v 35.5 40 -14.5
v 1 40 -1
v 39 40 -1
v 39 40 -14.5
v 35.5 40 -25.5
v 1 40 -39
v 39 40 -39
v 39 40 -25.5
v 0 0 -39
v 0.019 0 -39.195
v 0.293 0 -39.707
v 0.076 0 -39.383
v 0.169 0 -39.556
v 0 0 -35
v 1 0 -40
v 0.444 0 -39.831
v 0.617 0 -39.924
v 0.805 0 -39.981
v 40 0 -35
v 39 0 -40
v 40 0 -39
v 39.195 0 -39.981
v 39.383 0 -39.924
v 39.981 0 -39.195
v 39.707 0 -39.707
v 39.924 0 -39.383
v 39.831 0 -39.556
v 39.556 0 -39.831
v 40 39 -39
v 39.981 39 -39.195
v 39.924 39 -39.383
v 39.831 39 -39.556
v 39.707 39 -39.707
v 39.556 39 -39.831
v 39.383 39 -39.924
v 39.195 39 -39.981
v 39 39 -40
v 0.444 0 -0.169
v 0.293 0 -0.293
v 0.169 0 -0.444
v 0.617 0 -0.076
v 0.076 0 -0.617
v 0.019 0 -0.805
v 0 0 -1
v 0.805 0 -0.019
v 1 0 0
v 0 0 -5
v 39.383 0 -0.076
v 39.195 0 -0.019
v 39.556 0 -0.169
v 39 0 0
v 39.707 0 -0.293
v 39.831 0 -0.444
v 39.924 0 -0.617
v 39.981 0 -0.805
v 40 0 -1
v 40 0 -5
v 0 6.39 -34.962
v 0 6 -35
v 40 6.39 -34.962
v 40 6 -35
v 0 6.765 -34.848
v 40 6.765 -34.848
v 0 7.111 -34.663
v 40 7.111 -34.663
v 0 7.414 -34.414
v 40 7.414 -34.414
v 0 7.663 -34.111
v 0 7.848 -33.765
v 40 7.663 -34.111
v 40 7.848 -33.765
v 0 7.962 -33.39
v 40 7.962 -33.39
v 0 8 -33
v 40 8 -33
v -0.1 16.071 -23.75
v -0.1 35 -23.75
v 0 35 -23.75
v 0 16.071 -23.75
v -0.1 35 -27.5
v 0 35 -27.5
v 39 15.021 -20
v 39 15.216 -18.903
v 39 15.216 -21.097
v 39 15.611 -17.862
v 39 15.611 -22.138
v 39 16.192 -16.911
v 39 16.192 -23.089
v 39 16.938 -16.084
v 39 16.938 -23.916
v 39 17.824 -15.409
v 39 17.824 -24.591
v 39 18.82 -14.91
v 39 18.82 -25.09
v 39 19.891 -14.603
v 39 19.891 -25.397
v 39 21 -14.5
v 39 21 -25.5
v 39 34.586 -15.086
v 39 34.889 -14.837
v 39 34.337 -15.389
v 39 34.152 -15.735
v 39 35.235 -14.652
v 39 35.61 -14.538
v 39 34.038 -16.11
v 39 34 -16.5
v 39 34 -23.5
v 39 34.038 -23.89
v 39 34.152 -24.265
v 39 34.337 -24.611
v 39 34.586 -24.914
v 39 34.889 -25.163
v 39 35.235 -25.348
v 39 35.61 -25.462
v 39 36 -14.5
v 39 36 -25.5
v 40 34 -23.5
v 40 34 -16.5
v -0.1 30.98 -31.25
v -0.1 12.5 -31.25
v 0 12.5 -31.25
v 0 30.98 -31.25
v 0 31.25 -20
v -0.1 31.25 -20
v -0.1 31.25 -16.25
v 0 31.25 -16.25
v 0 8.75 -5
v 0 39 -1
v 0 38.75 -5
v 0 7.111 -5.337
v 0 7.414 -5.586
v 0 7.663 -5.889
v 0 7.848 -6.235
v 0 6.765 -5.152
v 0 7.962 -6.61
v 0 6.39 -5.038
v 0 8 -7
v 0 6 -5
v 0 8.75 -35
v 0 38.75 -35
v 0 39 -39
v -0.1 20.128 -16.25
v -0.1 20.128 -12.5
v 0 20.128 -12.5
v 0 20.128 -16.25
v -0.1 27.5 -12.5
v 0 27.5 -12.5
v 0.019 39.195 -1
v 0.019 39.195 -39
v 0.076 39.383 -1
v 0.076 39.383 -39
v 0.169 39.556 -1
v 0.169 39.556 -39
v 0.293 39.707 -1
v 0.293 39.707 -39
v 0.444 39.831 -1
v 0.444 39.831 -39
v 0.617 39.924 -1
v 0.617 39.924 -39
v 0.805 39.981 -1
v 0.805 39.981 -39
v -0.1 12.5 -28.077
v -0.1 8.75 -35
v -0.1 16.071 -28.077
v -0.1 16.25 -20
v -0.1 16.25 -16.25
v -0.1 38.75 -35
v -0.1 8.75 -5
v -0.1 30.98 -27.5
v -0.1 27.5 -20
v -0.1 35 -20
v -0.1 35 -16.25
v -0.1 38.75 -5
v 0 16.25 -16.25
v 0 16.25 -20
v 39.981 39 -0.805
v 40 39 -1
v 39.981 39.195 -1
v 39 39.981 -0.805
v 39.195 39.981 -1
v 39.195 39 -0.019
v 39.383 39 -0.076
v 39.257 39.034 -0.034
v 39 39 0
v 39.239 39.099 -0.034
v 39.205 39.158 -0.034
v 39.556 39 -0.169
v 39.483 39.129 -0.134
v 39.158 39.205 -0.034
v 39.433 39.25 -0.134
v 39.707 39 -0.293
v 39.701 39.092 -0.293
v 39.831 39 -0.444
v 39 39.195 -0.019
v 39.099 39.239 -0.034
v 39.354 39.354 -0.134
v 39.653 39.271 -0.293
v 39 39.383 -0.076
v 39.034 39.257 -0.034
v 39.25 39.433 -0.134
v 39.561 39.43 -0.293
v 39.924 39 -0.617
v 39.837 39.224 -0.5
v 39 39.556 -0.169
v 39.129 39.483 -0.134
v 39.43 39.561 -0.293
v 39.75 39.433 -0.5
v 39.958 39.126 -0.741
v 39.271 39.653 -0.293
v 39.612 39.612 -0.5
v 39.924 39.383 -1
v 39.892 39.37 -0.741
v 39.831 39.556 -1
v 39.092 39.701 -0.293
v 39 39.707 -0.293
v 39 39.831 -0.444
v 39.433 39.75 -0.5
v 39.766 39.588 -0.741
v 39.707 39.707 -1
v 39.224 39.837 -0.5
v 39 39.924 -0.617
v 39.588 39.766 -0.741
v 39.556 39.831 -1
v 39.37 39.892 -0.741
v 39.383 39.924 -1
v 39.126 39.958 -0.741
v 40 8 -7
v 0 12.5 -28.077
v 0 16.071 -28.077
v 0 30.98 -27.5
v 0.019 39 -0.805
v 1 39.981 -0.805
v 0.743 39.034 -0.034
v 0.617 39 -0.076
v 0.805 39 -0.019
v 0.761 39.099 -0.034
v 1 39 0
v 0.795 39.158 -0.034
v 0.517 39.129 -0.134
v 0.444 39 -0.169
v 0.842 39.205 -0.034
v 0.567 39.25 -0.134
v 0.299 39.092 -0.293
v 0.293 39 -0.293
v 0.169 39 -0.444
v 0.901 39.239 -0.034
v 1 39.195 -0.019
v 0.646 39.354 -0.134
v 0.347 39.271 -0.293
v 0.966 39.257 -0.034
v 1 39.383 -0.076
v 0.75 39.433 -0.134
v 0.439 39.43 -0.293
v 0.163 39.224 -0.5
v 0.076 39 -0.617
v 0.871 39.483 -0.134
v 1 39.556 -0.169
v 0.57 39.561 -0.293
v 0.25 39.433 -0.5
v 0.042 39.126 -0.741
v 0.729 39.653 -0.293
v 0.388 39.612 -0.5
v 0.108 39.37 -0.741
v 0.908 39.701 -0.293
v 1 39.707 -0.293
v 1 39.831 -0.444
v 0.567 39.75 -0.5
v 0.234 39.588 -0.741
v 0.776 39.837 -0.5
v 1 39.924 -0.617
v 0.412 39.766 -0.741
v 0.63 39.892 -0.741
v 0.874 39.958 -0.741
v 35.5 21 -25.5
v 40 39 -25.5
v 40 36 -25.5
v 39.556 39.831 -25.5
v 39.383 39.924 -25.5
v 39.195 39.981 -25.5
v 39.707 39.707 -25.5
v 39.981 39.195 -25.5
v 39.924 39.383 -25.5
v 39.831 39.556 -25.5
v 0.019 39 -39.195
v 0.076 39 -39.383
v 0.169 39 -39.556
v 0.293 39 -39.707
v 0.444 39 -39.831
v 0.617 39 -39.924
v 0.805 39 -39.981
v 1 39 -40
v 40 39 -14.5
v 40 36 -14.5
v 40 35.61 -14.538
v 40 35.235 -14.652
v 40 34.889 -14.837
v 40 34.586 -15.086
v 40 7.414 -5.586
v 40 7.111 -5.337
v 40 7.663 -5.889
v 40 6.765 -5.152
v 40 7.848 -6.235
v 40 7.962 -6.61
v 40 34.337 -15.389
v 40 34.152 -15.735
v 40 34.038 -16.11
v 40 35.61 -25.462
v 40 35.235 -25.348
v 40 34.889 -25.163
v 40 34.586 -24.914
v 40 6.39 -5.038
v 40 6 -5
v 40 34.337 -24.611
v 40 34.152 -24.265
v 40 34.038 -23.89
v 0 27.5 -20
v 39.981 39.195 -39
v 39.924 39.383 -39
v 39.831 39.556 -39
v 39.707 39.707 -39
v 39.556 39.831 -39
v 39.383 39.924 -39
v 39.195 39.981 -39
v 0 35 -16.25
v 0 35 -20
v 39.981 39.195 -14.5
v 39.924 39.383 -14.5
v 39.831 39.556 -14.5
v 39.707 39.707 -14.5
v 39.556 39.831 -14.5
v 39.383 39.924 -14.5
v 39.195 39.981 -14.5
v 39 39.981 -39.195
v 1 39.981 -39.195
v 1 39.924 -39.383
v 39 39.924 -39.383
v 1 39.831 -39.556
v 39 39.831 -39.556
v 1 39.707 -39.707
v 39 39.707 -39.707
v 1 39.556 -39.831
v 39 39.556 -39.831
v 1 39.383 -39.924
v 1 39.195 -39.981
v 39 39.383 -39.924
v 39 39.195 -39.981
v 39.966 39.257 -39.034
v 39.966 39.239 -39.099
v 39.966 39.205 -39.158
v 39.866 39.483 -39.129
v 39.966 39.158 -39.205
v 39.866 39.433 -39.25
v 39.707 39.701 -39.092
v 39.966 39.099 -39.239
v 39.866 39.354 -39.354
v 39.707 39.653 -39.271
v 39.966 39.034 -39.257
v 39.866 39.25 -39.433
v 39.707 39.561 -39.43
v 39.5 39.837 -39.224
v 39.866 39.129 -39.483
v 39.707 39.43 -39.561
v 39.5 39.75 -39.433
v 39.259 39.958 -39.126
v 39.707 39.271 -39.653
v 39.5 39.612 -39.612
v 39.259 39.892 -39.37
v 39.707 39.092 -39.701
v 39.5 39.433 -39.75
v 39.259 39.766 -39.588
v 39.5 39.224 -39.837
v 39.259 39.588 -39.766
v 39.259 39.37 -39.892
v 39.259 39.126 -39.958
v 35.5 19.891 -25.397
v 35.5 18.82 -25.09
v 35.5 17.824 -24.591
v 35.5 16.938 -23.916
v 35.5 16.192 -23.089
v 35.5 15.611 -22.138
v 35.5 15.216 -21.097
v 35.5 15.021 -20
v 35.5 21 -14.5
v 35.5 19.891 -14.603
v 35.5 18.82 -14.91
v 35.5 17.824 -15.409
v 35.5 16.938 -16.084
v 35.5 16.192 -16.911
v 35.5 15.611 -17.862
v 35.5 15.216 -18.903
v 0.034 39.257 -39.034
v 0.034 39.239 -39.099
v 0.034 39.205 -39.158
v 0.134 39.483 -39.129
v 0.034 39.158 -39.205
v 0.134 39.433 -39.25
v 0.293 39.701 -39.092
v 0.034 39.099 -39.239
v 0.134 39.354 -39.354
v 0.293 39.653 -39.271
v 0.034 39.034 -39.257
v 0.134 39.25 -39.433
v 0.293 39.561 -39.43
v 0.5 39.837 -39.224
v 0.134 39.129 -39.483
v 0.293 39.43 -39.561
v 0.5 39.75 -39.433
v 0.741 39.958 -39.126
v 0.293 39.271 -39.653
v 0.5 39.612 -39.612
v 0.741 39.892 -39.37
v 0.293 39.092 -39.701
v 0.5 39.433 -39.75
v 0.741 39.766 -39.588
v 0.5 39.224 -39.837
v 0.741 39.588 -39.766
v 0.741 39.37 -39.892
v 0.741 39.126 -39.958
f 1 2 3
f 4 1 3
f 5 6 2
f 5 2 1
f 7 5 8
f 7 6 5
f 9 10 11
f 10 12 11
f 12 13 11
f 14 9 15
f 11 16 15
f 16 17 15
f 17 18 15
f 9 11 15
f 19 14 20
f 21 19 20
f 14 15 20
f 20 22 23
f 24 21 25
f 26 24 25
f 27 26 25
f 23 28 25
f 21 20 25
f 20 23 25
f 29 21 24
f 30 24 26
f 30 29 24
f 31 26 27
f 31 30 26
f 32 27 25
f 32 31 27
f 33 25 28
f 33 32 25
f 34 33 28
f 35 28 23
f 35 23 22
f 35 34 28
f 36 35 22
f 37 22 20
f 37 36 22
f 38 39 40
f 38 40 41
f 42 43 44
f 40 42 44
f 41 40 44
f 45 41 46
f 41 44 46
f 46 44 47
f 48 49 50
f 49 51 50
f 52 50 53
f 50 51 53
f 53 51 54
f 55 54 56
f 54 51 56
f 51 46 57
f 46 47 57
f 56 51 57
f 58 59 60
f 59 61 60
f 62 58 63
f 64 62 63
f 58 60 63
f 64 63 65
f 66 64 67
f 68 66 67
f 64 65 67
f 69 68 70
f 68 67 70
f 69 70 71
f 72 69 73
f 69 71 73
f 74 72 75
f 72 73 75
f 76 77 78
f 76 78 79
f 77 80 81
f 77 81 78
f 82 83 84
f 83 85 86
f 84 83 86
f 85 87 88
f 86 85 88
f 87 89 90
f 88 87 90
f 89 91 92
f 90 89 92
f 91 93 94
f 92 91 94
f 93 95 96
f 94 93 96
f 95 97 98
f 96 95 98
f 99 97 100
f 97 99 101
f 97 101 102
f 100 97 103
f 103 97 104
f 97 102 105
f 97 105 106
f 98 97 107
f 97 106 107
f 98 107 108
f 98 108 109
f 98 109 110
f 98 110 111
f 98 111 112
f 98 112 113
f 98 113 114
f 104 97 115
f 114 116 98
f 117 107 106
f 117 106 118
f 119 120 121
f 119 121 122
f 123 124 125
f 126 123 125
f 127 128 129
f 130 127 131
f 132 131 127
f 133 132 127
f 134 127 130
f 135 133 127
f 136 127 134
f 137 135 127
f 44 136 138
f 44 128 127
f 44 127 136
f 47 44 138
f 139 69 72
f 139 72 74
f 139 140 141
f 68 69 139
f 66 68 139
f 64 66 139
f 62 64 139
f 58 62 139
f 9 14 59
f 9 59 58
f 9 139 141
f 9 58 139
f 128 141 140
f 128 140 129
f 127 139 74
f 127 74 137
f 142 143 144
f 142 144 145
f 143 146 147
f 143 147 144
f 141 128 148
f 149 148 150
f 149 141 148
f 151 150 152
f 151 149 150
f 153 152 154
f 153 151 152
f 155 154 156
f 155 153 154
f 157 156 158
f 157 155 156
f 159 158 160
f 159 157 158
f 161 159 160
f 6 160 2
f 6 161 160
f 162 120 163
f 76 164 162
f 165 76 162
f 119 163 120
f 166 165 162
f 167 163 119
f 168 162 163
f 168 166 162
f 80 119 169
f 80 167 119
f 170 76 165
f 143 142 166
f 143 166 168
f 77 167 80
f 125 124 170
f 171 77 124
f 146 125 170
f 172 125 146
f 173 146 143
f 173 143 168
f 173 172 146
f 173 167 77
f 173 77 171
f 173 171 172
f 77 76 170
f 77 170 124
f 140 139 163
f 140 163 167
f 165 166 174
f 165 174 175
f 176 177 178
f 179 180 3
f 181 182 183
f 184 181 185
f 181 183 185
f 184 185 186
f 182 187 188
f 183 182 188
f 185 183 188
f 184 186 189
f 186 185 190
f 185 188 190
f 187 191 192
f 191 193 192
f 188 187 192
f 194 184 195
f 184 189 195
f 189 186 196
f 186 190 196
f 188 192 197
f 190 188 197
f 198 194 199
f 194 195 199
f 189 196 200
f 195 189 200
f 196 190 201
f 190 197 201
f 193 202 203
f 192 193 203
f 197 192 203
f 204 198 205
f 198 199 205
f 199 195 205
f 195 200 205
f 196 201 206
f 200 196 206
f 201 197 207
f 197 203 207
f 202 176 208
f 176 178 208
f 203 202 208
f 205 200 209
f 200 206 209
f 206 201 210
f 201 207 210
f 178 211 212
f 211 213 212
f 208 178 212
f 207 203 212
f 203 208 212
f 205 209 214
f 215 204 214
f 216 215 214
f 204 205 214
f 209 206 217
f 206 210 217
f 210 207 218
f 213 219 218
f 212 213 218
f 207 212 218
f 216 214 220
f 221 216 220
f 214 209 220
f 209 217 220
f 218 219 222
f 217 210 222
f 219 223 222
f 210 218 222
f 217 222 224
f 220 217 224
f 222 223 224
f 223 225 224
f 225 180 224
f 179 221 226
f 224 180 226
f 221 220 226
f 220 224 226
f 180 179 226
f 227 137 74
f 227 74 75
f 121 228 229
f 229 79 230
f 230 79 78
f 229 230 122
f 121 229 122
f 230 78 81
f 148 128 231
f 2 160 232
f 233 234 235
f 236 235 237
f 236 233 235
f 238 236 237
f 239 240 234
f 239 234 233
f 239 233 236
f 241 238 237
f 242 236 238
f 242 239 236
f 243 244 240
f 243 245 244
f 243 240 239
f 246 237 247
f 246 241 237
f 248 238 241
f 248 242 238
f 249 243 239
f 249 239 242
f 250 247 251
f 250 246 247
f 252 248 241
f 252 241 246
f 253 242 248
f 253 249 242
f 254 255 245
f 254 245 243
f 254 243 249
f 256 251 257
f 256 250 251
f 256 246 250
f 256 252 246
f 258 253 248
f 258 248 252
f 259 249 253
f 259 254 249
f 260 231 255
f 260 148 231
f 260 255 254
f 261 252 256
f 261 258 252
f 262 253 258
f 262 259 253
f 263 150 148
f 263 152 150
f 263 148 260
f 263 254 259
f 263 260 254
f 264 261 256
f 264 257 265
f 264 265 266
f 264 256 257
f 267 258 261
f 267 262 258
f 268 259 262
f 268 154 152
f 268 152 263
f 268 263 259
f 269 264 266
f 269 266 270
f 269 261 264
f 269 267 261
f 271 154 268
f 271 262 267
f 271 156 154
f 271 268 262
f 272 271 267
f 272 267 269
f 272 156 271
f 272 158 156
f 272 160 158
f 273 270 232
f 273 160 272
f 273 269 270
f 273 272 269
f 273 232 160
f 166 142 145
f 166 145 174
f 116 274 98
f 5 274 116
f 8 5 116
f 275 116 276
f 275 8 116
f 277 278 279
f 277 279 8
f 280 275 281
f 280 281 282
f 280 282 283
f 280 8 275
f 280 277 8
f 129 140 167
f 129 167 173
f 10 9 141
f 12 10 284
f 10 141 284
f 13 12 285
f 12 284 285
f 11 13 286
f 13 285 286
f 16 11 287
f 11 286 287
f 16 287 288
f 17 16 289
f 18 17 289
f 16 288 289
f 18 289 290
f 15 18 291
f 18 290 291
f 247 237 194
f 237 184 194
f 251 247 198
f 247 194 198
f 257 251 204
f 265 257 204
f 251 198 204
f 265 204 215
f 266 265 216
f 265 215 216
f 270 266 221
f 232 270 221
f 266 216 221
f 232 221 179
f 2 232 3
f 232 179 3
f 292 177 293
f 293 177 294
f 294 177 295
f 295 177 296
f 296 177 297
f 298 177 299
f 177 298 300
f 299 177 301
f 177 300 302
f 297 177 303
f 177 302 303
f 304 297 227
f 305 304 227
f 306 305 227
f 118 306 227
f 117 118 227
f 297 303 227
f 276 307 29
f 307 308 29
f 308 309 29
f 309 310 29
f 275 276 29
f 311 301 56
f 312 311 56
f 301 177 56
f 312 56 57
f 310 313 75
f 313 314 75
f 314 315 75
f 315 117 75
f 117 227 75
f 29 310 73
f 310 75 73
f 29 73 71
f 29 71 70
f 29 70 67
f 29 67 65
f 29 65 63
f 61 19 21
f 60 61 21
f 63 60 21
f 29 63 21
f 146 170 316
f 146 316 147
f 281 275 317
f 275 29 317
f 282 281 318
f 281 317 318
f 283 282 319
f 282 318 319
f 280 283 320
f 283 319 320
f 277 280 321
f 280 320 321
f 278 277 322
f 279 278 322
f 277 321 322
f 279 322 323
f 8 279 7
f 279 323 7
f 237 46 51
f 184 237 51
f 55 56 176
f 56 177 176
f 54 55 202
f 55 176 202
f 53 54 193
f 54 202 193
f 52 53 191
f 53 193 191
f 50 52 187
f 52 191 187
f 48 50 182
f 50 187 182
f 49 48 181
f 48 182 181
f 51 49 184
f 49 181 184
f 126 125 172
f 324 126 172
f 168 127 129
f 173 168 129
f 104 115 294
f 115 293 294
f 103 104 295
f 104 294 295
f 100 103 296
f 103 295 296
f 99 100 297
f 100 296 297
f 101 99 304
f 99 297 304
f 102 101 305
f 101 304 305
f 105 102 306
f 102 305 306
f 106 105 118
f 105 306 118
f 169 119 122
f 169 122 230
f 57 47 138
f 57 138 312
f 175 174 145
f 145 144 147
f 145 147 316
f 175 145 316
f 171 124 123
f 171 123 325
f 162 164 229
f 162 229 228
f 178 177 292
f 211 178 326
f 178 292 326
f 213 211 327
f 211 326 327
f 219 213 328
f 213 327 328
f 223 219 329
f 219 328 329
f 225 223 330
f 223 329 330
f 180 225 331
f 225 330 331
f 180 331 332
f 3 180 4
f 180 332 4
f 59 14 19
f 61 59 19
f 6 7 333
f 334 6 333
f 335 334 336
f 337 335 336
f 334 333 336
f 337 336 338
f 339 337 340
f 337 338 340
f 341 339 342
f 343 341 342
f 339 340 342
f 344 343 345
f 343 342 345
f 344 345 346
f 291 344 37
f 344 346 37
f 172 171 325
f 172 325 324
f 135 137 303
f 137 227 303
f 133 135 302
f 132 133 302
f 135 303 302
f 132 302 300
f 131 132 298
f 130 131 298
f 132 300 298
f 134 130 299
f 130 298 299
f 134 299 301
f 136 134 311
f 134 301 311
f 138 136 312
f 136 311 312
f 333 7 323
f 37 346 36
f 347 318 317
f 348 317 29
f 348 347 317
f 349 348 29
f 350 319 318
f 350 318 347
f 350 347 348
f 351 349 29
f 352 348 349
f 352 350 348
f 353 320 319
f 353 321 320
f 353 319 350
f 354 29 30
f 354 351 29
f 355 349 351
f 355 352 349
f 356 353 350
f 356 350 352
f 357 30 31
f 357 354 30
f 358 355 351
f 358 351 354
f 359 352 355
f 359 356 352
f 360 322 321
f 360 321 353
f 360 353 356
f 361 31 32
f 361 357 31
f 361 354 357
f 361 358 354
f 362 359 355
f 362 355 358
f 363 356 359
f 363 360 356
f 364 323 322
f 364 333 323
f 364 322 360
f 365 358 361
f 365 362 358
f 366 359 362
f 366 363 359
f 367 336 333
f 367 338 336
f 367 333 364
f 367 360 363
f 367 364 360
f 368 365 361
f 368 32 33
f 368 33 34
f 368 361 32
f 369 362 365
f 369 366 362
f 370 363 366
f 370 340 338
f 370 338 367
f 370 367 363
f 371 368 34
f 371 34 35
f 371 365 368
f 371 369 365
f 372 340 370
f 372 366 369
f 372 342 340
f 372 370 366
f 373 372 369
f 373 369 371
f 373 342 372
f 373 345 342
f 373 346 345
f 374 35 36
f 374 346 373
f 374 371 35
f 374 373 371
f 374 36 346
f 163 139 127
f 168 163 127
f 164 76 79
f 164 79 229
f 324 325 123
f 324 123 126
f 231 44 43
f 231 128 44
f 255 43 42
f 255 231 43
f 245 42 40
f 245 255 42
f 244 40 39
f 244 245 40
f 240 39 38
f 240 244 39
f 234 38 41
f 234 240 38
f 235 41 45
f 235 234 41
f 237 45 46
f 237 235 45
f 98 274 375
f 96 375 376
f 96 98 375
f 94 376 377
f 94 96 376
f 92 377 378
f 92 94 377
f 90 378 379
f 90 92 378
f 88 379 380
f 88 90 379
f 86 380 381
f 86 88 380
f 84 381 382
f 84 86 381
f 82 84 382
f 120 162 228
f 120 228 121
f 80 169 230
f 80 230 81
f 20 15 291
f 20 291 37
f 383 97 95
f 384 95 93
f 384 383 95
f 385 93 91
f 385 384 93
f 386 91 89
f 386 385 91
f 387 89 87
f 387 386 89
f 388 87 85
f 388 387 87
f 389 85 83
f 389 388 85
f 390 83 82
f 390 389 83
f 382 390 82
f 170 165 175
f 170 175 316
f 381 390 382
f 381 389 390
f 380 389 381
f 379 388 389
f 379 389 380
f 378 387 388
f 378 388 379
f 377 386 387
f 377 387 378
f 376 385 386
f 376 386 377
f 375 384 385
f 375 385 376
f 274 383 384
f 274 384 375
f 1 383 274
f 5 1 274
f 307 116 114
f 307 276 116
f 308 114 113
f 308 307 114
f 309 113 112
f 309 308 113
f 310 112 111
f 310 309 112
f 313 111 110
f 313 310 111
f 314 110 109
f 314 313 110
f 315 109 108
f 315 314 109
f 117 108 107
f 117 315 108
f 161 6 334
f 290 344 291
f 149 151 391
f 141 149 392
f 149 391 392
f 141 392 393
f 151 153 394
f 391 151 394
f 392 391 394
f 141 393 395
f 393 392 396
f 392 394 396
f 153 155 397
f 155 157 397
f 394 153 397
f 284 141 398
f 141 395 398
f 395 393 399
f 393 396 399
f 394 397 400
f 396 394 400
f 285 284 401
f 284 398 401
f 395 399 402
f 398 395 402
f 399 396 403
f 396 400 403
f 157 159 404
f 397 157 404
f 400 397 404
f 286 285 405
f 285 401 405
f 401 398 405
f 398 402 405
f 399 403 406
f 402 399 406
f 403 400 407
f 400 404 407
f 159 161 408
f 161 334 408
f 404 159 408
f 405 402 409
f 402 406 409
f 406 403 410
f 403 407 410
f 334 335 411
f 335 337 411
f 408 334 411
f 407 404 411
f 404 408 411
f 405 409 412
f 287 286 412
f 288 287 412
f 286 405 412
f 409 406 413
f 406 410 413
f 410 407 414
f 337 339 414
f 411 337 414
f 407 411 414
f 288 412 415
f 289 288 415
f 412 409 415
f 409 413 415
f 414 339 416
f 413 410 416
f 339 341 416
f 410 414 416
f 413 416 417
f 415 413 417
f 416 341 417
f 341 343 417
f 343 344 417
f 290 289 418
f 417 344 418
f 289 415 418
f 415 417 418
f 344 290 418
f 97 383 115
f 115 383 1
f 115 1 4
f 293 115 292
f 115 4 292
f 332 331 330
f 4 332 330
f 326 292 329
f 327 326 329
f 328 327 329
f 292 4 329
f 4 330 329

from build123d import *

# Parameters (mm, degrees)
SKETCH1_W           = 40
SKETCH1_H           = 40
BOSS_EXTRUDE1_DEPTH = 40
SKETCH2_W           = 40
SKETCH2_H           = 30
FORK_CUTOUT_DEPTH   = 8
SKETCH5_W           = 3.5
SKETCH5_H           = 11
CUT_EXTRUDE3_DEPTH  = 25
FILLET5_R           = 6
SKETCH6_W           = 1
SKETCH6_H           = 11
CUT_EXTRUDE4_DEPTH  = 6
FILLET6_R           = 2
FILLET8_R           = 2
SKETCH7_W           = 30
SKETCH7_H           = 30
BOSS_EXTRUDE2_DEPTH = 0.1
SKETCH10_W          = 3.75
SKETCH10_H          = 3.75
MARK38_DEPTH        = 0.1
FILLET9_R           = 1


with BuildPart() as part:
    # Sketch1 → Boss-Extrude1 (new body)
    with BuildSketch(Plane(origin=(0, 0, 0), x_dir=(1, 0, 0), z_dir=(0, 1, 0))):
        with Locations((20, 20)):
            Rectangle(SKETCH1_W, SKETCH1_H)
    extrude(amount=BOSS_EXTRUDE1_DEPTH)

    # Sketch2 → Fork Cutout (cut)
    with BuildSketch(Plane.XZ):
        with Locations((20, -20)):
            Rectangle(SKETCH2_W, SKETCH2_H)
    extrude(amount=-FORK_CUTOUT_DEPTH, mode=Mode.SUBTRACT)

    # Sketch5 → Cut-Extrude3 (cut)
    with BuildSketch(Plane(origin=(0, 40, 0), x_dir=(1, 0, 0), z_dir=(0, 1, 0))):
        with Locations((37.25, 20)):
            Rectangle(SKETCH5_W, SKETCH5_H)
    extrude(amount=-CUT_EXTRUDE3_DEPTH, mode=Mode.SUBTRACT)

    # Fillet5
    # the kernel refuses this fillet: 6 mm, written as the material it adds along each edge
    with BuildSketch(Plane(origin=(20.5, 15, -14.5), x_dir=(0, 1, 0), z_dir=(1, 0, 0)), Plane(origin=(39, 15, -25.5), x_dir=(0, 1, 0), z_dir=(-1, 0, 0))) as fillet5_piece_1:
        with BuildLine():
            CenterArc((FILLET5_R, -FILLET5_R), FILLET5_R, 90, 90)
            Line((0, -FILLET5_R), (0, 0))
            Line((0, 0), (FILLET5_R, 0))
        make_face()
    extrude(amount=18.5)

    # Sketch6 → Cut-Extrude4 (cut)
    with BuildSketch(Plane(origin=(0, 40, 0), x_dir=(1, 0, 0), z_dir=(0, 1, 0))):
        with Locations((39.5, 20)):
            Rectangle(SKETCH6_W, SKETCH6_H)
    extrude(amount=-CUT_EXTRUDE4_DEPTH, mode=Mode.SUBTRACT)

    # Fillet6
    fillet6_edges = [part.edges().sort_by_distance(p)[0] for p in [
        (39.5, 34, -25.5),
        (39.5, 34, -14.5),
    ]]
    fillet(fillet6_edges, radius=FILLET6_R)

    # Fillet8
    fillet8_edges = [part.edges().sort_by_distance(p)[0] for p in [
        (20, 8, -5),
        (20, 8, -35),
    ]]
    fillet(fillet8_edges, radius=FILLET8_R)

    # Sketch7 → Boss-Extrude2 (add)
    with BuildSketch(Plane.ZY):
        with Locations((-20, 23.75)):
            Rectangle(SKETCH7_W, SKETCH7_H)
    extrude(amount=BOSS_EXTRUDE2_DEPTH)

    # Sketch10 → Mark38 (cut)
    with BuildSketch(Plane.ZY.offset(0.1)):
        with Locations((-18.125, 33.125)):
            Rectangle(SKETCH10_W, SKETCH10_H)
        Polygon((-20, 27.5), (-12.5, 27.5), (-12.5, 20.128421558), (-16.25, 20.128421558), (-16.25, 16.25), (-20, 16.25), align=None)
        Polygon((-27.5, 35), (-23.75, 35), (-23.75, 16.071209331), (-28.076745998, 16.071209331), (-28.076745998, 12.5), (-31.25, 12.5), (-31.25, 30.980466229), (-27.5, 30.980466229), align=None)
    extrude(amount=-MARK38_DEPTH, mode=Mode.SUBTRACT)

    # Fillet9
    fillet9_edges = [part.edges().sort_by_distance(p)[0] for p in [
        (40, 40, -7.25),
        (20, 40, -40),
        (0, 40, -20),
        (40, 40, -32.75),
        (0, 20, -40),
        (40, 20, -40),
        (40, 20, 0),
        (0, 20, 0),
        (20, 40, 0),
    ]]
    fillet(fillet9_edges, radius=FILLET9_R)


solid = part.part
